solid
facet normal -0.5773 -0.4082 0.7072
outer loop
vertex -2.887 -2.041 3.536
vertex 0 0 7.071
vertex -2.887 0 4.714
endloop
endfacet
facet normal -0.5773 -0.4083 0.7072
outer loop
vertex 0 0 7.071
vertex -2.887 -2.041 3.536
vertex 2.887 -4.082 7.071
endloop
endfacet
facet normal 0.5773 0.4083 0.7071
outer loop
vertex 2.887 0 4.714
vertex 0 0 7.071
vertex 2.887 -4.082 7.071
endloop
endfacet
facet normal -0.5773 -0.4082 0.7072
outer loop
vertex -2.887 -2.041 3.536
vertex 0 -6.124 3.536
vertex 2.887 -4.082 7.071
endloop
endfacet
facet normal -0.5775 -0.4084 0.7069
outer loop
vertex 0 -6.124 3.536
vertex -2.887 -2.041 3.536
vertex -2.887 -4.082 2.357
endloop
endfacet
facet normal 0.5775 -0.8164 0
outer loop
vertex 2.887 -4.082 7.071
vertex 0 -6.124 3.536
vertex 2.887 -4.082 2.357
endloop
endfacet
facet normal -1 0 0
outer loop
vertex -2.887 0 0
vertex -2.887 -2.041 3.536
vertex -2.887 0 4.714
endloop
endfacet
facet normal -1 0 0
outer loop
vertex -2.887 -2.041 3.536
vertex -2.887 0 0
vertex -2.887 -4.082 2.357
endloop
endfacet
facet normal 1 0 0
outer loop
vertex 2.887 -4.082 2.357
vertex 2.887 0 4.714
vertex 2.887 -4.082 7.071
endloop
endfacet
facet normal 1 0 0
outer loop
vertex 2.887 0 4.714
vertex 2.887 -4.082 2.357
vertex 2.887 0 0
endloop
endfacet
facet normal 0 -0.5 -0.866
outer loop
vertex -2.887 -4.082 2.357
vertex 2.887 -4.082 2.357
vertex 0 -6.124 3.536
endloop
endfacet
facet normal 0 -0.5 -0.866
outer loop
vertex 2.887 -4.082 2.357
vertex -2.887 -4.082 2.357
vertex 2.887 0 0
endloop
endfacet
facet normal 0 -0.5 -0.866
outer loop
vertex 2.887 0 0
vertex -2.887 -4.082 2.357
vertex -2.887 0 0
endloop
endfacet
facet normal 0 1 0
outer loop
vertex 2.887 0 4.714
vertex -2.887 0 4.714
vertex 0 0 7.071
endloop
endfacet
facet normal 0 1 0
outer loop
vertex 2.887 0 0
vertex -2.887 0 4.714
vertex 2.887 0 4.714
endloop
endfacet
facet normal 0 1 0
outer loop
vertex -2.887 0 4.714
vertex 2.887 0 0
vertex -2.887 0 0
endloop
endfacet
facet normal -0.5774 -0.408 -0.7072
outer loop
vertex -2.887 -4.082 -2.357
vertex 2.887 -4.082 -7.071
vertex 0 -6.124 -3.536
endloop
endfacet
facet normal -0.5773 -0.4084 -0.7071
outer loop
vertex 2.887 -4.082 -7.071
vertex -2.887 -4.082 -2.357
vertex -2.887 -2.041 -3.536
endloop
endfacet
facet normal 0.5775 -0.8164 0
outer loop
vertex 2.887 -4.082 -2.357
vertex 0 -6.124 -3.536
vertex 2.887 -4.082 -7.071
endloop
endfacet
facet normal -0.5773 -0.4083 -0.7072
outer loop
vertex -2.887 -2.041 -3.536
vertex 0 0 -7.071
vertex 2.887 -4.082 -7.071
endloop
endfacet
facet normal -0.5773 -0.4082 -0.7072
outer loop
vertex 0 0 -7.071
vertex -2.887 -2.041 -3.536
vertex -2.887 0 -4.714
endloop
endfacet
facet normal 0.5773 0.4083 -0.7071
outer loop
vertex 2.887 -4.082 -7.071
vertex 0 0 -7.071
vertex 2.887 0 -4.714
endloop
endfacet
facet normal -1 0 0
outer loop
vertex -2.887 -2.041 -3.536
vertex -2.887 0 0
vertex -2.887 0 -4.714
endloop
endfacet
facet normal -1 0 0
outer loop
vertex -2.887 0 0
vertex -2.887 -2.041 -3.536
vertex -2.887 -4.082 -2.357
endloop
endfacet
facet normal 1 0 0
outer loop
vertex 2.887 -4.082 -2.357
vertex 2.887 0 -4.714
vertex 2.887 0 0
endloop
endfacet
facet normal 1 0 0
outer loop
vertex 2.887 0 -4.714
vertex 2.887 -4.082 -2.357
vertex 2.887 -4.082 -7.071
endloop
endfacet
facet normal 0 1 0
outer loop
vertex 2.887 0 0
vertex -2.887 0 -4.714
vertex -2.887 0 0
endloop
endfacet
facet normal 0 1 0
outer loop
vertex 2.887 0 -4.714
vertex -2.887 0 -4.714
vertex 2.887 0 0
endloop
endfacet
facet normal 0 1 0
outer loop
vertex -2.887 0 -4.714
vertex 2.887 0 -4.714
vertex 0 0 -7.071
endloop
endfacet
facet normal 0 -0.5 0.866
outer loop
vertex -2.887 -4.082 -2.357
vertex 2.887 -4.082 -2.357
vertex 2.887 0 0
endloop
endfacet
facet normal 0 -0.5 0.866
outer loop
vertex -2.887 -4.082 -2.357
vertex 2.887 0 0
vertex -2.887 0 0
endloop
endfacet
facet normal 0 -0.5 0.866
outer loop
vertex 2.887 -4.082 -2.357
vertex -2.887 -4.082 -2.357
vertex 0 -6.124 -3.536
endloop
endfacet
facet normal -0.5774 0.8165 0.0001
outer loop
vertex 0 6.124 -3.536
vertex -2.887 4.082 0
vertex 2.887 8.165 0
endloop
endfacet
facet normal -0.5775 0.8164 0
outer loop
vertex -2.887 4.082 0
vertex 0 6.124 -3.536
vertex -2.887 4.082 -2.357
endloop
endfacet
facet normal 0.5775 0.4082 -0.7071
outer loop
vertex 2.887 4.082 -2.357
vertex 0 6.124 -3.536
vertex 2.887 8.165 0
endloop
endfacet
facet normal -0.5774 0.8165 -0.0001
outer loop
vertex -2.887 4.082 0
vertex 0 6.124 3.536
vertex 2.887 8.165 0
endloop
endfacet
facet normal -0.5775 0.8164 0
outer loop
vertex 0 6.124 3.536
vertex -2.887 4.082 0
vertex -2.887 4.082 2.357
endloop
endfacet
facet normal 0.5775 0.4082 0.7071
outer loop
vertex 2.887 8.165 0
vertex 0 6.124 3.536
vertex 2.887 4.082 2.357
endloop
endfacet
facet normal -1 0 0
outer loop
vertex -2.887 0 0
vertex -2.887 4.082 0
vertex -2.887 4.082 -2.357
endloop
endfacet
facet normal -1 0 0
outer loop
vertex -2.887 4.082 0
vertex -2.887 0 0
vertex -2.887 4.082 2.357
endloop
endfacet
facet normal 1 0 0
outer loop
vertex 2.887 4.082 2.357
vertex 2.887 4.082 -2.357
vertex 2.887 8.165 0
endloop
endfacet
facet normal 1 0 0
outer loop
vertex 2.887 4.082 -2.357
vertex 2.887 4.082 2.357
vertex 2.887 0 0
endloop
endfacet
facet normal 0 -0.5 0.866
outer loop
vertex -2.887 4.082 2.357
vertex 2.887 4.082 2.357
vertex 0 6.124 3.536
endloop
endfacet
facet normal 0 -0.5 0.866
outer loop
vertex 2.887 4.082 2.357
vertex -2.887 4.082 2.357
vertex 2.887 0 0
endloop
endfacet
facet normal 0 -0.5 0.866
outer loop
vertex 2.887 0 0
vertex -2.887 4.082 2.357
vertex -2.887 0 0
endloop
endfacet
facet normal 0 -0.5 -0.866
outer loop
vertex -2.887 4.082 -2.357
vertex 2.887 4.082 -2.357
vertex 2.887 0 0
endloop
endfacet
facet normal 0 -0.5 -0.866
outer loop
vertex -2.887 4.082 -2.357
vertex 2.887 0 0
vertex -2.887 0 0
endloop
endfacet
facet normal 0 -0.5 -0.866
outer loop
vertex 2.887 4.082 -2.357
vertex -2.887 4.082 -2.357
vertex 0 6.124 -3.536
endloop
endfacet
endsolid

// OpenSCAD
// OpenSCAD 为免费开源的跨平台建模软件
// 作者：上海市第三女子初级中学 谢丁

a = 10; // 立方体的边长
e = 0.0; // 咬合面距离调整，数值越小，咬合精度越高
length = norm([a, a, a]); // 欧氏距离
b = acos(a / length); // 倾斜角
c = atan2(a, a);    // 方位角

for (i = [1:3]) // 循环三次
{
  rotate([i * 120, 0, 0]) // 每隔120°生成一个正三棱柱结构
  intersection() // 相交布尔运算
  {
    difference() // 相减布尔运算
    {
      rotate([0, -c, 90 - b]) cube([a, a, a], center = true); // 原始立方体
      translate([-length / 3, 0, 0]) cube([sqrt(3)*a / 3, sqrt(3)*a, sqrt(3)*a], center = true); // 左侧的立方体结构
      translate([length / 3, 0, 0]) cube([sqrt(3)*a / 3, sqrt(3)*a, sqrt(3)*a], center = true); // 右侧的立方体结构
    }
    // 正三棱柱结构
    translate([0, sqrt(3)*a / 2 + e, 0]) rotate([30, 0, 0]) rotate([0, 90, 0]) cylinder(h = sqrt(3) * a / 3, r = sqrt(3) * a / 2, $fn = 3, center = true);
  }
}
